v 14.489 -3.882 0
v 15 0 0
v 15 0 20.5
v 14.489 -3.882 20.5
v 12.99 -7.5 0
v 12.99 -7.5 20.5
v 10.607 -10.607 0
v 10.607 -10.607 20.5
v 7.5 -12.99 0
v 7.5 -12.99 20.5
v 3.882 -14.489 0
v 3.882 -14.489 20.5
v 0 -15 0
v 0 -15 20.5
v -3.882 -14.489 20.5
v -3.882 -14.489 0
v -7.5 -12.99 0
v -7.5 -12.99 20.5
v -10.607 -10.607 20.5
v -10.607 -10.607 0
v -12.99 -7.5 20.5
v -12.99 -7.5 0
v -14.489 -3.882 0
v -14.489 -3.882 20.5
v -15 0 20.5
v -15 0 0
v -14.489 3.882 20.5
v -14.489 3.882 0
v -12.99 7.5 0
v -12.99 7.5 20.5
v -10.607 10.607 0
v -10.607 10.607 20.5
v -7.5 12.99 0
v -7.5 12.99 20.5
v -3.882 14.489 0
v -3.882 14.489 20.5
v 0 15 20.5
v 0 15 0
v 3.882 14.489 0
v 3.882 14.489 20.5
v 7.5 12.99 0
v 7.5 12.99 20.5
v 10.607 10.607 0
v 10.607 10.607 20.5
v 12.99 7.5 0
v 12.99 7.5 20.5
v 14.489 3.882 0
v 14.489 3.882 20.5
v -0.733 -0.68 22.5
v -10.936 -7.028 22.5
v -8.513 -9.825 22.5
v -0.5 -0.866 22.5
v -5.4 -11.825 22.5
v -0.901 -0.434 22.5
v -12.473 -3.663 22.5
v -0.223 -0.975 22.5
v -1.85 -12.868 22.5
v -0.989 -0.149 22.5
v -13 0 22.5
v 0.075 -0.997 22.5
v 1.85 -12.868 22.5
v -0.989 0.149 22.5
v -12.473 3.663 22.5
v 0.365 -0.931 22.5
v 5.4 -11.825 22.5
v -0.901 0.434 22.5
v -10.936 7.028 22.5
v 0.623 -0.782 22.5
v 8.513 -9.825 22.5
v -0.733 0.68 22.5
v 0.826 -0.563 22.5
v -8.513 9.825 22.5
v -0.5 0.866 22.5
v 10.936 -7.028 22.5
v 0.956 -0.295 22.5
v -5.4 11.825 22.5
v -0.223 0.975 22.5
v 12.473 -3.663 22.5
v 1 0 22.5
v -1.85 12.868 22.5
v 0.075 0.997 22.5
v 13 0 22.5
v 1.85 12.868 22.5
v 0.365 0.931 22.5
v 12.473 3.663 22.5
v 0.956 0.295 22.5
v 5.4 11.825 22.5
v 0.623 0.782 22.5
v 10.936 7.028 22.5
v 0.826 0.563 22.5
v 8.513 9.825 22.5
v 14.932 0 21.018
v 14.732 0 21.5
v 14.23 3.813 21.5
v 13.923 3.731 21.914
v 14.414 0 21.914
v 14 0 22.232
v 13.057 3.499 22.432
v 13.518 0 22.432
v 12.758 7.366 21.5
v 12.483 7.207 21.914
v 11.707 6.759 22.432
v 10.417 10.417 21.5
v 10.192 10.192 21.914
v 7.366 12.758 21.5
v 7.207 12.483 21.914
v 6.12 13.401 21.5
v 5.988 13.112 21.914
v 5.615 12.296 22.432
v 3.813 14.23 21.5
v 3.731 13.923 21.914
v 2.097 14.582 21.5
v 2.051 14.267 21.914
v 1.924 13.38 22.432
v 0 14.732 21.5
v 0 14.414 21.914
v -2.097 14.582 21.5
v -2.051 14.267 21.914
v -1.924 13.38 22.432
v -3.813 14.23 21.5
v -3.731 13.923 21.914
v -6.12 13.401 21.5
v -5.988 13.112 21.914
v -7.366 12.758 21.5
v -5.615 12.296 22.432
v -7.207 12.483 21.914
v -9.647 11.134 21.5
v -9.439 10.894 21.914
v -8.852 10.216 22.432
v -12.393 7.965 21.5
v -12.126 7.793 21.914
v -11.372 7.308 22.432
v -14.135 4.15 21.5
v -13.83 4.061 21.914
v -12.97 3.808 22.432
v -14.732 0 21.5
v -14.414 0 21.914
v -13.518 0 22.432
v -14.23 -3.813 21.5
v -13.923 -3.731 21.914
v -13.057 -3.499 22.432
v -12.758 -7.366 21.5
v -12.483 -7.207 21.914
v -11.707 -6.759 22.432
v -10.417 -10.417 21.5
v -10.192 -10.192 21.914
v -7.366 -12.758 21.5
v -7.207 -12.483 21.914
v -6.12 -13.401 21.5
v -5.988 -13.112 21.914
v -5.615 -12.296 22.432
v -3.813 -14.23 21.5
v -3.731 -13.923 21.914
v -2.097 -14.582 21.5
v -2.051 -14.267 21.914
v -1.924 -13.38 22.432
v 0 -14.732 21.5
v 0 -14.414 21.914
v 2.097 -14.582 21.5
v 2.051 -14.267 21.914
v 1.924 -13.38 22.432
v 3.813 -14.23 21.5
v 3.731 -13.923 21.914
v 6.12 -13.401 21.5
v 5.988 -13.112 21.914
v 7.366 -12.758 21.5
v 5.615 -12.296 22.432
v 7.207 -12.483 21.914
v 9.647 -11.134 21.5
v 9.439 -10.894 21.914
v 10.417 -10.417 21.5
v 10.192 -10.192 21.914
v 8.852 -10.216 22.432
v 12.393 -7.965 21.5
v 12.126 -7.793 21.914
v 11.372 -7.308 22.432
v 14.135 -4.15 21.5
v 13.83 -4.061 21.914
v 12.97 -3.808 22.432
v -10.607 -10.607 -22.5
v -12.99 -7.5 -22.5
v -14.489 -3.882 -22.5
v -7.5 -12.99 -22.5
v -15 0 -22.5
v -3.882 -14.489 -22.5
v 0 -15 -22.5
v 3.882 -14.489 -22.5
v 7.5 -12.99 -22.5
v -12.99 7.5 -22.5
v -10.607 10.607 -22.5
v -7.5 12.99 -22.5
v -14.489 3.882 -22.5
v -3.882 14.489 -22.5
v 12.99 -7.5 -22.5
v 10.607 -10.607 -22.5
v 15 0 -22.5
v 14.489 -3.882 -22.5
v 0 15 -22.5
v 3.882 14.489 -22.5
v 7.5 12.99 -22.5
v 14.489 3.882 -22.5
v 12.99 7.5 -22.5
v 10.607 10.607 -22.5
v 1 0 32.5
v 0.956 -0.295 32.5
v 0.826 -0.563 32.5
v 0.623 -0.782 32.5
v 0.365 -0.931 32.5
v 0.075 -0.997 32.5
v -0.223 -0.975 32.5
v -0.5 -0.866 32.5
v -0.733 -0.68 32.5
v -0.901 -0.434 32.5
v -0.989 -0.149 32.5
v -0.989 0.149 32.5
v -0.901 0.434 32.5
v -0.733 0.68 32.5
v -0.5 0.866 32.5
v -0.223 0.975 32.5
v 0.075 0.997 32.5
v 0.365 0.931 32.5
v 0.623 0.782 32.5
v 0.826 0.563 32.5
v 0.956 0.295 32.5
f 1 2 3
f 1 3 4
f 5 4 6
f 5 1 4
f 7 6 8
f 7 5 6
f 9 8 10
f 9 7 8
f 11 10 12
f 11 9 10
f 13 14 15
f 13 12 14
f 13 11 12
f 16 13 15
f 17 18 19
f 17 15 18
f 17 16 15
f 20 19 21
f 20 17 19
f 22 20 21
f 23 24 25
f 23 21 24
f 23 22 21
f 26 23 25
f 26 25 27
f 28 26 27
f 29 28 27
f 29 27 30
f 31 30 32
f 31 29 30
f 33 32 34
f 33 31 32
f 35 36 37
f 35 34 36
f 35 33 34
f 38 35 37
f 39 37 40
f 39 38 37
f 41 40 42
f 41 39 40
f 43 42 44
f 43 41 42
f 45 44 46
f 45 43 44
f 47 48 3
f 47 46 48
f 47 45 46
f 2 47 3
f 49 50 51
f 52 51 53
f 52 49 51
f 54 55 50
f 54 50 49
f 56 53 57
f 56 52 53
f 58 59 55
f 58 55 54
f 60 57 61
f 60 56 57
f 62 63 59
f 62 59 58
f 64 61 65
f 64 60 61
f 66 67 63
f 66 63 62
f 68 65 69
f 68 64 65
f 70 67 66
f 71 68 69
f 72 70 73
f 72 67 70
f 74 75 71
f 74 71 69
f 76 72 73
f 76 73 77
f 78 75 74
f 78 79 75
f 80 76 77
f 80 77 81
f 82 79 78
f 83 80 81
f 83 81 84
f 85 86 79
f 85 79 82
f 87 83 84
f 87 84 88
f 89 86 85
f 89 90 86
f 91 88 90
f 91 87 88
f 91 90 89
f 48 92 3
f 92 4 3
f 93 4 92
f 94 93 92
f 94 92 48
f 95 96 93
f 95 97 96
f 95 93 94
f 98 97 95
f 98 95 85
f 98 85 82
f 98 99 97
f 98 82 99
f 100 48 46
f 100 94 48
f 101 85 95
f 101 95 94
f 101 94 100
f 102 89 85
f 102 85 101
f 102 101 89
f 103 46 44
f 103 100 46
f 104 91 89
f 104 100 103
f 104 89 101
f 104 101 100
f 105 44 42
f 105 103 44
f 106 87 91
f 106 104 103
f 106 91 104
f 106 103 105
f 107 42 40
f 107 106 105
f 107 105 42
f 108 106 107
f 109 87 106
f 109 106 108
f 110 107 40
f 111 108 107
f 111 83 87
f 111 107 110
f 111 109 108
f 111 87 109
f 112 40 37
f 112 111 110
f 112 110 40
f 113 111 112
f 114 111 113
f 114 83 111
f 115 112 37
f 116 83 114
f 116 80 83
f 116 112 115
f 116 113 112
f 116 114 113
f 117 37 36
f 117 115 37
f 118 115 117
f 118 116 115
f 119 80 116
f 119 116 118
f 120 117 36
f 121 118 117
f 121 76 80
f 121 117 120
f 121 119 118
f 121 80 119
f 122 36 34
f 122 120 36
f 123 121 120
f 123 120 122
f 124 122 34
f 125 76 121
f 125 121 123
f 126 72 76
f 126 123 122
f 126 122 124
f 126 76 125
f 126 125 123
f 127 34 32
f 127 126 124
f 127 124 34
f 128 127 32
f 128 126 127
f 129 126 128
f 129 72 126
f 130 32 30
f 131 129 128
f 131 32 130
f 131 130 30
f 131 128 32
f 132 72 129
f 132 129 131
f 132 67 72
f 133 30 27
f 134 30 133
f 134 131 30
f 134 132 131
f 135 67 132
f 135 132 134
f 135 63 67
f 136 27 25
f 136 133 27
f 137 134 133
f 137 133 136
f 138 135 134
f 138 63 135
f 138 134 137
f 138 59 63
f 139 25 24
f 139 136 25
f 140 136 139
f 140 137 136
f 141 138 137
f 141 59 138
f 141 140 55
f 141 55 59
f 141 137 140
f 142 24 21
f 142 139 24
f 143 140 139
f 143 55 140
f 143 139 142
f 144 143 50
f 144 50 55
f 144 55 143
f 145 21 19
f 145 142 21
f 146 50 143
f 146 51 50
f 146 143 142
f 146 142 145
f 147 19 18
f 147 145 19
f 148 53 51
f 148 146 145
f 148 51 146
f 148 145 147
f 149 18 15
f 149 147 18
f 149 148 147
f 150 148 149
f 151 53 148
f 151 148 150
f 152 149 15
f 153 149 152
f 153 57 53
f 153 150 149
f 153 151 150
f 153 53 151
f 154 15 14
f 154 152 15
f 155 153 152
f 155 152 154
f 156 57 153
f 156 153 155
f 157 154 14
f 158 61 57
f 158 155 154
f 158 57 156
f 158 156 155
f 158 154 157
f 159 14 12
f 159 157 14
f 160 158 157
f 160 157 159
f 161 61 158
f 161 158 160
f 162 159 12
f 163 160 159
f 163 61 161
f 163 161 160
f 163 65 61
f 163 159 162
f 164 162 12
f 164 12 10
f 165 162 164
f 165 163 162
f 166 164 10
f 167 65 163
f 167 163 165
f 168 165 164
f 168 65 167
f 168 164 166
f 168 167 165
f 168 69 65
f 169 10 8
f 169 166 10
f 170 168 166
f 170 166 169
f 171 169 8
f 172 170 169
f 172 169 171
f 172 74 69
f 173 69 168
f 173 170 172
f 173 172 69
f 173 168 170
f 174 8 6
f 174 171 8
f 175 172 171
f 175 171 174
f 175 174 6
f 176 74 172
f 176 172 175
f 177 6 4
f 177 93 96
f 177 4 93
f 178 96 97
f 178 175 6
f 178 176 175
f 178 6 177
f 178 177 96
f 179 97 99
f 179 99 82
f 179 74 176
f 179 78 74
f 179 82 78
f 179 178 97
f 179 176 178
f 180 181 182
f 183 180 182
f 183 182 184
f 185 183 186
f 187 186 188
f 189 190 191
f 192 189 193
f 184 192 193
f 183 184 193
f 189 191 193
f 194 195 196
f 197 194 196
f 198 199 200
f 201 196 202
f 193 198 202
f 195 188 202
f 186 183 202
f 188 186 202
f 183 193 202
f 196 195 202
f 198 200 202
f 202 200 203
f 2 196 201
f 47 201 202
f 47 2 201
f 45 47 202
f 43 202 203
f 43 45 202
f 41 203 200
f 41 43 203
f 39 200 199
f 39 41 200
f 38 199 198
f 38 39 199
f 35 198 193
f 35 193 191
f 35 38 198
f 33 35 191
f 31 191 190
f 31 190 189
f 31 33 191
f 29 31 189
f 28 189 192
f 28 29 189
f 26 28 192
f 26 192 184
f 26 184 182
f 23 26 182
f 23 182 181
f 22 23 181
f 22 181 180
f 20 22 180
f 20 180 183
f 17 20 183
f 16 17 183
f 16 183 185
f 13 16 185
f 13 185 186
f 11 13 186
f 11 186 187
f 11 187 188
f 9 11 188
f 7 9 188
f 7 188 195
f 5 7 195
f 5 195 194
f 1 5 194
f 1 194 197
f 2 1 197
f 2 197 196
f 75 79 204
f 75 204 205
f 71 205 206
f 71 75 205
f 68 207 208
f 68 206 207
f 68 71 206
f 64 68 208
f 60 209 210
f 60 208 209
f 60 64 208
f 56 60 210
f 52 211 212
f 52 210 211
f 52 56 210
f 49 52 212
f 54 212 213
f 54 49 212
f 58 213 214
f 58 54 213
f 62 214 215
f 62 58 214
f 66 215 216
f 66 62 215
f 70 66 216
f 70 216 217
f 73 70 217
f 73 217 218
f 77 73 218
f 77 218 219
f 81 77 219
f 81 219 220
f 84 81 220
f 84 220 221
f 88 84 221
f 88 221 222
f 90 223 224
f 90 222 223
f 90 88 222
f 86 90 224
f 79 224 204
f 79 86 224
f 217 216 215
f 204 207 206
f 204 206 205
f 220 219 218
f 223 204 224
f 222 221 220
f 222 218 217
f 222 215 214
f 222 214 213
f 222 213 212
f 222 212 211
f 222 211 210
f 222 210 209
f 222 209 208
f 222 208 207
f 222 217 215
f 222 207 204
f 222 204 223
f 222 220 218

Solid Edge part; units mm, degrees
sketch "Sketch1" plane through (0, 0, 0) normal (0, 0, 1) x (1, 0, 0)
  circle A0 centre (0, 0) radius 15
  dimension "D1" = 30
extrude "Ajout_matière_1" add sketch "Sketch1" along normal mid plane 45
sketch "Sketch2" plane through (0, 0, 22.5) normal (0, 0, 1) x (1, 0, 0)
  circle A0 centre (0, 0) radius 1
  dimension "D1" = 2
extrude "Ajout_matière_2" add sketch "Sketch2" along normal blind 10
fillet "Congé_1" radius 2 1 edges at (-15, 0, 22.5)
properties material "Acier S235"
